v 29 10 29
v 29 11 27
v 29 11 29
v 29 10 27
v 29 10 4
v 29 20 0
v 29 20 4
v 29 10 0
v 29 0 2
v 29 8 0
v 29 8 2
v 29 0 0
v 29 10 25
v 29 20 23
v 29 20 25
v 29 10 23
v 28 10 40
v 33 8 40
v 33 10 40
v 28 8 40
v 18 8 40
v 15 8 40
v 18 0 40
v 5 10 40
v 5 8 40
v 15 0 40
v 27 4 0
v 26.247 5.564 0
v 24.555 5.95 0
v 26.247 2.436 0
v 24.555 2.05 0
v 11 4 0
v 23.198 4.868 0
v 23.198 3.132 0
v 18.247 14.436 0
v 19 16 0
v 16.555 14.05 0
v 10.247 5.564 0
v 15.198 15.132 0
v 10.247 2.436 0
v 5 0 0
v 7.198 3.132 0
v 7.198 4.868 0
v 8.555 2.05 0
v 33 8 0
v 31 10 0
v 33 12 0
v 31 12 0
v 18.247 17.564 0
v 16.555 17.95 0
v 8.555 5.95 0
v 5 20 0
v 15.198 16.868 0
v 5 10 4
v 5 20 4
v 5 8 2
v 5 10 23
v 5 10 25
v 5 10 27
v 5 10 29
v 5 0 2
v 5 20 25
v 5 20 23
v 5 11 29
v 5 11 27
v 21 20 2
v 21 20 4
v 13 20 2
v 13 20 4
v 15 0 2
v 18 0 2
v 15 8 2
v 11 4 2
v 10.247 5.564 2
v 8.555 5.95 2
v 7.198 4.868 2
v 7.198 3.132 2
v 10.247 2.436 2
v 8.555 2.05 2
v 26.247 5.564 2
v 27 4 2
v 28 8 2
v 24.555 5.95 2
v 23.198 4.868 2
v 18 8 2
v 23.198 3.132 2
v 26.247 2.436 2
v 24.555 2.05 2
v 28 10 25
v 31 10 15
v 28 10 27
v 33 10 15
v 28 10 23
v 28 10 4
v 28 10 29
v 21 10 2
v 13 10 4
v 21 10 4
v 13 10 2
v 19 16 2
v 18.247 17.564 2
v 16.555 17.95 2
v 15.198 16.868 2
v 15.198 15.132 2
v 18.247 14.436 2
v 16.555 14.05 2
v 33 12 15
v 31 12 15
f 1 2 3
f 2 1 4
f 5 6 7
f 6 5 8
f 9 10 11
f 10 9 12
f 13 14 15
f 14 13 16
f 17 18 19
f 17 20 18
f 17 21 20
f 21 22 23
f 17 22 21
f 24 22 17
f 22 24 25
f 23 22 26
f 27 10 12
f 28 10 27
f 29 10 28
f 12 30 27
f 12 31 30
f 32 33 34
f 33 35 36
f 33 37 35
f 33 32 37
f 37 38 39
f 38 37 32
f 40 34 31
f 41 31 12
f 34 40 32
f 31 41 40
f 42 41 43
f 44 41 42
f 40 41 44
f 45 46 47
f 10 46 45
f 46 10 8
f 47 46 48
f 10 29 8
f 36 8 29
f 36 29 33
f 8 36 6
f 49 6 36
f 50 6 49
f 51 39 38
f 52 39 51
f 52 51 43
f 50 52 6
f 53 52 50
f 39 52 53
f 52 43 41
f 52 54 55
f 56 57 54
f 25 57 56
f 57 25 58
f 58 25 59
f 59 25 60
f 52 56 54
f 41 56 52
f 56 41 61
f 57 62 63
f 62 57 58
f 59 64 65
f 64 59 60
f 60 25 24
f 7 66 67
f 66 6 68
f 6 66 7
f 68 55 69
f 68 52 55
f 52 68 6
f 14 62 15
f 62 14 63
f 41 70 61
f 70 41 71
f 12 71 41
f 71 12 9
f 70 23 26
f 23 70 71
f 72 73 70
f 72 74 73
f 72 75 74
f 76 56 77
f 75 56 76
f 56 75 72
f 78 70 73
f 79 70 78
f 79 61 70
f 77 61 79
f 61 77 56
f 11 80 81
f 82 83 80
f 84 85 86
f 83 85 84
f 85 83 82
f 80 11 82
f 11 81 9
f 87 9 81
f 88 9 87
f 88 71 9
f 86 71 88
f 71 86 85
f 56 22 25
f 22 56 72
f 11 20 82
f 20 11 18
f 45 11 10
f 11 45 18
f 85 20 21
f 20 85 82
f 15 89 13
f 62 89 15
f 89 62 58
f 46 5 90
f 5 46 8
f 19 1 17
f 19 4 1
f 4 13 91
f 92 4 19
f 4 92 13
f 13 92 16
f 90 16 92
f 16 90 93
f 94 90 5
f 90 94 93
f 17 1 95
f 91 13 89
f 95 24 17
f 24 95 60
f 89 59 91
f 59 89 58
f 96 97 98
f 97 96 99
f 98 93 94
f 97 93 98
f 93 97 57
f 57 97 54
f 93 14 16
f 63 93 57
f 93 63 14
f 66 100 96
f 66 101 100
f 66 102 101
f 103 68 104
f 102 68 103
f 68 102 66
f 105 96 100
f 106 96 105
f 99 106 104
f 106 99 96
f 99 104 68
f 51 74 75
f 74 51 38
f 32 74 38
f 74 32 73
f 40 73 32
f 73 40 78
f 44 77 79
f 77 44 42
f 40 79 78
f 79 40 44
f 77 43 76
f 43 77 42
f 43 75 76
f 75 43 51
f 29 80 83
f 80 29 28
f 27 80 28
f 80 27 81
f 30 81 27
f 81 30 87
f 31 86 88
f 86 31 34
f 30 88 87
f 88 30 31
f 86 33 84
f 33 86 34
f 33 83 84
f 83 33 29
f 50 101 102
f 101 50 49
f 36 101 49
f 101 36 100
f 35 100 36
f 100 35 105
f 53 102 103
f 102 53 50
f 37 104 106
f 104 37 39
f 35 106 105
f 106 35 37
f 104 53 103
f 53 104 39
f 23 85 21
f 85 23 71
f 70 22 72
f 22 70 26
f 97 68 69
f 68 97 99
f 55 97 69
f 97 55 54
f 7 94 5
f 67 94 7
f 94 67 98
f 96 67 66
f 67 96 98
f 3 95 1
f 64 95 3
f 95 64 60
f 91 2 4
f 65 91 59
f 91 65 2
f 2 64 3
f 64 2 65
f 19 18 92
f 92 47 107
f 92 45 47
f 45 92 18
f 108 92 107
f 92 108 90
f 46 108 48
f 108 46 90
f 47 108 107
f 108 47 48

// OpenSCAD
largeur = 3;
hauteur = 5;
epaisseur = 2;

translate([5,0,0])
union(){
difference(){
difference(){
    cube([largeur*8, 20, hauteur*8]);
    translate([-1,-1,epaisseur]){
        cube([largeur*8+2, 9, hauteur*8]);
    };
    translate([-1,8+epaisseur,24+epaisseur/2]){
        cube([largeur*8+2, 8+epaisseur+1, 24+epaisseur/2]);
    };
    translate([-1,8+epaisseur,epaisseur]){
        cube([largeur*8+2, 8+epaisseur+1, 24-epaisseur/2-epaisseur]);
    };
};


/*union(){
for(i=[0:largeur]){
    for(j=[0:1]){
      
        translate([4+i*8, 12, 8+j*8]){
            rotate([90,0,0]){
            cylinder(h=4, r= 2);
            }
        }
    };
    for(j=[3:hauteur-2]){
      
        translate([4+i*8, 12, 8+j*8]){
            rotate([90,0,0]){
            cylinder(h=4, r= 2);
            }
        }
    }
    
    
    }
};*/
union(){
    for(i=[0:largeur]){
        translate([4+i*8, 4, -1]){
            if(i==0 || i == largeur-1)
            cylinder(h=4, r=2);
            }
    }
};

union(){
    for(i=[0:largeur]){
        translate([4+i*8, 16, -1]){
            if(i!=0 && i != largeur-1)
            cylinder(h=epaisseur+2, r=2);
            }
    }
};

};

translate([10,0,0]){cube([3, 9,hauteur*8 ]);};

translate([0, 9, 0]){cube([8,11, epaisseur+2]);};
translate([8*(largeur-1), 9, 0]){cube([8,11, epaisseur+2]);};

translate([0,9,27]){cube([largeur*8, 2, 2]);};
};

translate([largeur*8+4,8,0]){cube([5, epaisseur, hauteur*8]);}

translate([(largeur+1)*8-1,9,0]){cube([2,3,3*hauteur]);};
